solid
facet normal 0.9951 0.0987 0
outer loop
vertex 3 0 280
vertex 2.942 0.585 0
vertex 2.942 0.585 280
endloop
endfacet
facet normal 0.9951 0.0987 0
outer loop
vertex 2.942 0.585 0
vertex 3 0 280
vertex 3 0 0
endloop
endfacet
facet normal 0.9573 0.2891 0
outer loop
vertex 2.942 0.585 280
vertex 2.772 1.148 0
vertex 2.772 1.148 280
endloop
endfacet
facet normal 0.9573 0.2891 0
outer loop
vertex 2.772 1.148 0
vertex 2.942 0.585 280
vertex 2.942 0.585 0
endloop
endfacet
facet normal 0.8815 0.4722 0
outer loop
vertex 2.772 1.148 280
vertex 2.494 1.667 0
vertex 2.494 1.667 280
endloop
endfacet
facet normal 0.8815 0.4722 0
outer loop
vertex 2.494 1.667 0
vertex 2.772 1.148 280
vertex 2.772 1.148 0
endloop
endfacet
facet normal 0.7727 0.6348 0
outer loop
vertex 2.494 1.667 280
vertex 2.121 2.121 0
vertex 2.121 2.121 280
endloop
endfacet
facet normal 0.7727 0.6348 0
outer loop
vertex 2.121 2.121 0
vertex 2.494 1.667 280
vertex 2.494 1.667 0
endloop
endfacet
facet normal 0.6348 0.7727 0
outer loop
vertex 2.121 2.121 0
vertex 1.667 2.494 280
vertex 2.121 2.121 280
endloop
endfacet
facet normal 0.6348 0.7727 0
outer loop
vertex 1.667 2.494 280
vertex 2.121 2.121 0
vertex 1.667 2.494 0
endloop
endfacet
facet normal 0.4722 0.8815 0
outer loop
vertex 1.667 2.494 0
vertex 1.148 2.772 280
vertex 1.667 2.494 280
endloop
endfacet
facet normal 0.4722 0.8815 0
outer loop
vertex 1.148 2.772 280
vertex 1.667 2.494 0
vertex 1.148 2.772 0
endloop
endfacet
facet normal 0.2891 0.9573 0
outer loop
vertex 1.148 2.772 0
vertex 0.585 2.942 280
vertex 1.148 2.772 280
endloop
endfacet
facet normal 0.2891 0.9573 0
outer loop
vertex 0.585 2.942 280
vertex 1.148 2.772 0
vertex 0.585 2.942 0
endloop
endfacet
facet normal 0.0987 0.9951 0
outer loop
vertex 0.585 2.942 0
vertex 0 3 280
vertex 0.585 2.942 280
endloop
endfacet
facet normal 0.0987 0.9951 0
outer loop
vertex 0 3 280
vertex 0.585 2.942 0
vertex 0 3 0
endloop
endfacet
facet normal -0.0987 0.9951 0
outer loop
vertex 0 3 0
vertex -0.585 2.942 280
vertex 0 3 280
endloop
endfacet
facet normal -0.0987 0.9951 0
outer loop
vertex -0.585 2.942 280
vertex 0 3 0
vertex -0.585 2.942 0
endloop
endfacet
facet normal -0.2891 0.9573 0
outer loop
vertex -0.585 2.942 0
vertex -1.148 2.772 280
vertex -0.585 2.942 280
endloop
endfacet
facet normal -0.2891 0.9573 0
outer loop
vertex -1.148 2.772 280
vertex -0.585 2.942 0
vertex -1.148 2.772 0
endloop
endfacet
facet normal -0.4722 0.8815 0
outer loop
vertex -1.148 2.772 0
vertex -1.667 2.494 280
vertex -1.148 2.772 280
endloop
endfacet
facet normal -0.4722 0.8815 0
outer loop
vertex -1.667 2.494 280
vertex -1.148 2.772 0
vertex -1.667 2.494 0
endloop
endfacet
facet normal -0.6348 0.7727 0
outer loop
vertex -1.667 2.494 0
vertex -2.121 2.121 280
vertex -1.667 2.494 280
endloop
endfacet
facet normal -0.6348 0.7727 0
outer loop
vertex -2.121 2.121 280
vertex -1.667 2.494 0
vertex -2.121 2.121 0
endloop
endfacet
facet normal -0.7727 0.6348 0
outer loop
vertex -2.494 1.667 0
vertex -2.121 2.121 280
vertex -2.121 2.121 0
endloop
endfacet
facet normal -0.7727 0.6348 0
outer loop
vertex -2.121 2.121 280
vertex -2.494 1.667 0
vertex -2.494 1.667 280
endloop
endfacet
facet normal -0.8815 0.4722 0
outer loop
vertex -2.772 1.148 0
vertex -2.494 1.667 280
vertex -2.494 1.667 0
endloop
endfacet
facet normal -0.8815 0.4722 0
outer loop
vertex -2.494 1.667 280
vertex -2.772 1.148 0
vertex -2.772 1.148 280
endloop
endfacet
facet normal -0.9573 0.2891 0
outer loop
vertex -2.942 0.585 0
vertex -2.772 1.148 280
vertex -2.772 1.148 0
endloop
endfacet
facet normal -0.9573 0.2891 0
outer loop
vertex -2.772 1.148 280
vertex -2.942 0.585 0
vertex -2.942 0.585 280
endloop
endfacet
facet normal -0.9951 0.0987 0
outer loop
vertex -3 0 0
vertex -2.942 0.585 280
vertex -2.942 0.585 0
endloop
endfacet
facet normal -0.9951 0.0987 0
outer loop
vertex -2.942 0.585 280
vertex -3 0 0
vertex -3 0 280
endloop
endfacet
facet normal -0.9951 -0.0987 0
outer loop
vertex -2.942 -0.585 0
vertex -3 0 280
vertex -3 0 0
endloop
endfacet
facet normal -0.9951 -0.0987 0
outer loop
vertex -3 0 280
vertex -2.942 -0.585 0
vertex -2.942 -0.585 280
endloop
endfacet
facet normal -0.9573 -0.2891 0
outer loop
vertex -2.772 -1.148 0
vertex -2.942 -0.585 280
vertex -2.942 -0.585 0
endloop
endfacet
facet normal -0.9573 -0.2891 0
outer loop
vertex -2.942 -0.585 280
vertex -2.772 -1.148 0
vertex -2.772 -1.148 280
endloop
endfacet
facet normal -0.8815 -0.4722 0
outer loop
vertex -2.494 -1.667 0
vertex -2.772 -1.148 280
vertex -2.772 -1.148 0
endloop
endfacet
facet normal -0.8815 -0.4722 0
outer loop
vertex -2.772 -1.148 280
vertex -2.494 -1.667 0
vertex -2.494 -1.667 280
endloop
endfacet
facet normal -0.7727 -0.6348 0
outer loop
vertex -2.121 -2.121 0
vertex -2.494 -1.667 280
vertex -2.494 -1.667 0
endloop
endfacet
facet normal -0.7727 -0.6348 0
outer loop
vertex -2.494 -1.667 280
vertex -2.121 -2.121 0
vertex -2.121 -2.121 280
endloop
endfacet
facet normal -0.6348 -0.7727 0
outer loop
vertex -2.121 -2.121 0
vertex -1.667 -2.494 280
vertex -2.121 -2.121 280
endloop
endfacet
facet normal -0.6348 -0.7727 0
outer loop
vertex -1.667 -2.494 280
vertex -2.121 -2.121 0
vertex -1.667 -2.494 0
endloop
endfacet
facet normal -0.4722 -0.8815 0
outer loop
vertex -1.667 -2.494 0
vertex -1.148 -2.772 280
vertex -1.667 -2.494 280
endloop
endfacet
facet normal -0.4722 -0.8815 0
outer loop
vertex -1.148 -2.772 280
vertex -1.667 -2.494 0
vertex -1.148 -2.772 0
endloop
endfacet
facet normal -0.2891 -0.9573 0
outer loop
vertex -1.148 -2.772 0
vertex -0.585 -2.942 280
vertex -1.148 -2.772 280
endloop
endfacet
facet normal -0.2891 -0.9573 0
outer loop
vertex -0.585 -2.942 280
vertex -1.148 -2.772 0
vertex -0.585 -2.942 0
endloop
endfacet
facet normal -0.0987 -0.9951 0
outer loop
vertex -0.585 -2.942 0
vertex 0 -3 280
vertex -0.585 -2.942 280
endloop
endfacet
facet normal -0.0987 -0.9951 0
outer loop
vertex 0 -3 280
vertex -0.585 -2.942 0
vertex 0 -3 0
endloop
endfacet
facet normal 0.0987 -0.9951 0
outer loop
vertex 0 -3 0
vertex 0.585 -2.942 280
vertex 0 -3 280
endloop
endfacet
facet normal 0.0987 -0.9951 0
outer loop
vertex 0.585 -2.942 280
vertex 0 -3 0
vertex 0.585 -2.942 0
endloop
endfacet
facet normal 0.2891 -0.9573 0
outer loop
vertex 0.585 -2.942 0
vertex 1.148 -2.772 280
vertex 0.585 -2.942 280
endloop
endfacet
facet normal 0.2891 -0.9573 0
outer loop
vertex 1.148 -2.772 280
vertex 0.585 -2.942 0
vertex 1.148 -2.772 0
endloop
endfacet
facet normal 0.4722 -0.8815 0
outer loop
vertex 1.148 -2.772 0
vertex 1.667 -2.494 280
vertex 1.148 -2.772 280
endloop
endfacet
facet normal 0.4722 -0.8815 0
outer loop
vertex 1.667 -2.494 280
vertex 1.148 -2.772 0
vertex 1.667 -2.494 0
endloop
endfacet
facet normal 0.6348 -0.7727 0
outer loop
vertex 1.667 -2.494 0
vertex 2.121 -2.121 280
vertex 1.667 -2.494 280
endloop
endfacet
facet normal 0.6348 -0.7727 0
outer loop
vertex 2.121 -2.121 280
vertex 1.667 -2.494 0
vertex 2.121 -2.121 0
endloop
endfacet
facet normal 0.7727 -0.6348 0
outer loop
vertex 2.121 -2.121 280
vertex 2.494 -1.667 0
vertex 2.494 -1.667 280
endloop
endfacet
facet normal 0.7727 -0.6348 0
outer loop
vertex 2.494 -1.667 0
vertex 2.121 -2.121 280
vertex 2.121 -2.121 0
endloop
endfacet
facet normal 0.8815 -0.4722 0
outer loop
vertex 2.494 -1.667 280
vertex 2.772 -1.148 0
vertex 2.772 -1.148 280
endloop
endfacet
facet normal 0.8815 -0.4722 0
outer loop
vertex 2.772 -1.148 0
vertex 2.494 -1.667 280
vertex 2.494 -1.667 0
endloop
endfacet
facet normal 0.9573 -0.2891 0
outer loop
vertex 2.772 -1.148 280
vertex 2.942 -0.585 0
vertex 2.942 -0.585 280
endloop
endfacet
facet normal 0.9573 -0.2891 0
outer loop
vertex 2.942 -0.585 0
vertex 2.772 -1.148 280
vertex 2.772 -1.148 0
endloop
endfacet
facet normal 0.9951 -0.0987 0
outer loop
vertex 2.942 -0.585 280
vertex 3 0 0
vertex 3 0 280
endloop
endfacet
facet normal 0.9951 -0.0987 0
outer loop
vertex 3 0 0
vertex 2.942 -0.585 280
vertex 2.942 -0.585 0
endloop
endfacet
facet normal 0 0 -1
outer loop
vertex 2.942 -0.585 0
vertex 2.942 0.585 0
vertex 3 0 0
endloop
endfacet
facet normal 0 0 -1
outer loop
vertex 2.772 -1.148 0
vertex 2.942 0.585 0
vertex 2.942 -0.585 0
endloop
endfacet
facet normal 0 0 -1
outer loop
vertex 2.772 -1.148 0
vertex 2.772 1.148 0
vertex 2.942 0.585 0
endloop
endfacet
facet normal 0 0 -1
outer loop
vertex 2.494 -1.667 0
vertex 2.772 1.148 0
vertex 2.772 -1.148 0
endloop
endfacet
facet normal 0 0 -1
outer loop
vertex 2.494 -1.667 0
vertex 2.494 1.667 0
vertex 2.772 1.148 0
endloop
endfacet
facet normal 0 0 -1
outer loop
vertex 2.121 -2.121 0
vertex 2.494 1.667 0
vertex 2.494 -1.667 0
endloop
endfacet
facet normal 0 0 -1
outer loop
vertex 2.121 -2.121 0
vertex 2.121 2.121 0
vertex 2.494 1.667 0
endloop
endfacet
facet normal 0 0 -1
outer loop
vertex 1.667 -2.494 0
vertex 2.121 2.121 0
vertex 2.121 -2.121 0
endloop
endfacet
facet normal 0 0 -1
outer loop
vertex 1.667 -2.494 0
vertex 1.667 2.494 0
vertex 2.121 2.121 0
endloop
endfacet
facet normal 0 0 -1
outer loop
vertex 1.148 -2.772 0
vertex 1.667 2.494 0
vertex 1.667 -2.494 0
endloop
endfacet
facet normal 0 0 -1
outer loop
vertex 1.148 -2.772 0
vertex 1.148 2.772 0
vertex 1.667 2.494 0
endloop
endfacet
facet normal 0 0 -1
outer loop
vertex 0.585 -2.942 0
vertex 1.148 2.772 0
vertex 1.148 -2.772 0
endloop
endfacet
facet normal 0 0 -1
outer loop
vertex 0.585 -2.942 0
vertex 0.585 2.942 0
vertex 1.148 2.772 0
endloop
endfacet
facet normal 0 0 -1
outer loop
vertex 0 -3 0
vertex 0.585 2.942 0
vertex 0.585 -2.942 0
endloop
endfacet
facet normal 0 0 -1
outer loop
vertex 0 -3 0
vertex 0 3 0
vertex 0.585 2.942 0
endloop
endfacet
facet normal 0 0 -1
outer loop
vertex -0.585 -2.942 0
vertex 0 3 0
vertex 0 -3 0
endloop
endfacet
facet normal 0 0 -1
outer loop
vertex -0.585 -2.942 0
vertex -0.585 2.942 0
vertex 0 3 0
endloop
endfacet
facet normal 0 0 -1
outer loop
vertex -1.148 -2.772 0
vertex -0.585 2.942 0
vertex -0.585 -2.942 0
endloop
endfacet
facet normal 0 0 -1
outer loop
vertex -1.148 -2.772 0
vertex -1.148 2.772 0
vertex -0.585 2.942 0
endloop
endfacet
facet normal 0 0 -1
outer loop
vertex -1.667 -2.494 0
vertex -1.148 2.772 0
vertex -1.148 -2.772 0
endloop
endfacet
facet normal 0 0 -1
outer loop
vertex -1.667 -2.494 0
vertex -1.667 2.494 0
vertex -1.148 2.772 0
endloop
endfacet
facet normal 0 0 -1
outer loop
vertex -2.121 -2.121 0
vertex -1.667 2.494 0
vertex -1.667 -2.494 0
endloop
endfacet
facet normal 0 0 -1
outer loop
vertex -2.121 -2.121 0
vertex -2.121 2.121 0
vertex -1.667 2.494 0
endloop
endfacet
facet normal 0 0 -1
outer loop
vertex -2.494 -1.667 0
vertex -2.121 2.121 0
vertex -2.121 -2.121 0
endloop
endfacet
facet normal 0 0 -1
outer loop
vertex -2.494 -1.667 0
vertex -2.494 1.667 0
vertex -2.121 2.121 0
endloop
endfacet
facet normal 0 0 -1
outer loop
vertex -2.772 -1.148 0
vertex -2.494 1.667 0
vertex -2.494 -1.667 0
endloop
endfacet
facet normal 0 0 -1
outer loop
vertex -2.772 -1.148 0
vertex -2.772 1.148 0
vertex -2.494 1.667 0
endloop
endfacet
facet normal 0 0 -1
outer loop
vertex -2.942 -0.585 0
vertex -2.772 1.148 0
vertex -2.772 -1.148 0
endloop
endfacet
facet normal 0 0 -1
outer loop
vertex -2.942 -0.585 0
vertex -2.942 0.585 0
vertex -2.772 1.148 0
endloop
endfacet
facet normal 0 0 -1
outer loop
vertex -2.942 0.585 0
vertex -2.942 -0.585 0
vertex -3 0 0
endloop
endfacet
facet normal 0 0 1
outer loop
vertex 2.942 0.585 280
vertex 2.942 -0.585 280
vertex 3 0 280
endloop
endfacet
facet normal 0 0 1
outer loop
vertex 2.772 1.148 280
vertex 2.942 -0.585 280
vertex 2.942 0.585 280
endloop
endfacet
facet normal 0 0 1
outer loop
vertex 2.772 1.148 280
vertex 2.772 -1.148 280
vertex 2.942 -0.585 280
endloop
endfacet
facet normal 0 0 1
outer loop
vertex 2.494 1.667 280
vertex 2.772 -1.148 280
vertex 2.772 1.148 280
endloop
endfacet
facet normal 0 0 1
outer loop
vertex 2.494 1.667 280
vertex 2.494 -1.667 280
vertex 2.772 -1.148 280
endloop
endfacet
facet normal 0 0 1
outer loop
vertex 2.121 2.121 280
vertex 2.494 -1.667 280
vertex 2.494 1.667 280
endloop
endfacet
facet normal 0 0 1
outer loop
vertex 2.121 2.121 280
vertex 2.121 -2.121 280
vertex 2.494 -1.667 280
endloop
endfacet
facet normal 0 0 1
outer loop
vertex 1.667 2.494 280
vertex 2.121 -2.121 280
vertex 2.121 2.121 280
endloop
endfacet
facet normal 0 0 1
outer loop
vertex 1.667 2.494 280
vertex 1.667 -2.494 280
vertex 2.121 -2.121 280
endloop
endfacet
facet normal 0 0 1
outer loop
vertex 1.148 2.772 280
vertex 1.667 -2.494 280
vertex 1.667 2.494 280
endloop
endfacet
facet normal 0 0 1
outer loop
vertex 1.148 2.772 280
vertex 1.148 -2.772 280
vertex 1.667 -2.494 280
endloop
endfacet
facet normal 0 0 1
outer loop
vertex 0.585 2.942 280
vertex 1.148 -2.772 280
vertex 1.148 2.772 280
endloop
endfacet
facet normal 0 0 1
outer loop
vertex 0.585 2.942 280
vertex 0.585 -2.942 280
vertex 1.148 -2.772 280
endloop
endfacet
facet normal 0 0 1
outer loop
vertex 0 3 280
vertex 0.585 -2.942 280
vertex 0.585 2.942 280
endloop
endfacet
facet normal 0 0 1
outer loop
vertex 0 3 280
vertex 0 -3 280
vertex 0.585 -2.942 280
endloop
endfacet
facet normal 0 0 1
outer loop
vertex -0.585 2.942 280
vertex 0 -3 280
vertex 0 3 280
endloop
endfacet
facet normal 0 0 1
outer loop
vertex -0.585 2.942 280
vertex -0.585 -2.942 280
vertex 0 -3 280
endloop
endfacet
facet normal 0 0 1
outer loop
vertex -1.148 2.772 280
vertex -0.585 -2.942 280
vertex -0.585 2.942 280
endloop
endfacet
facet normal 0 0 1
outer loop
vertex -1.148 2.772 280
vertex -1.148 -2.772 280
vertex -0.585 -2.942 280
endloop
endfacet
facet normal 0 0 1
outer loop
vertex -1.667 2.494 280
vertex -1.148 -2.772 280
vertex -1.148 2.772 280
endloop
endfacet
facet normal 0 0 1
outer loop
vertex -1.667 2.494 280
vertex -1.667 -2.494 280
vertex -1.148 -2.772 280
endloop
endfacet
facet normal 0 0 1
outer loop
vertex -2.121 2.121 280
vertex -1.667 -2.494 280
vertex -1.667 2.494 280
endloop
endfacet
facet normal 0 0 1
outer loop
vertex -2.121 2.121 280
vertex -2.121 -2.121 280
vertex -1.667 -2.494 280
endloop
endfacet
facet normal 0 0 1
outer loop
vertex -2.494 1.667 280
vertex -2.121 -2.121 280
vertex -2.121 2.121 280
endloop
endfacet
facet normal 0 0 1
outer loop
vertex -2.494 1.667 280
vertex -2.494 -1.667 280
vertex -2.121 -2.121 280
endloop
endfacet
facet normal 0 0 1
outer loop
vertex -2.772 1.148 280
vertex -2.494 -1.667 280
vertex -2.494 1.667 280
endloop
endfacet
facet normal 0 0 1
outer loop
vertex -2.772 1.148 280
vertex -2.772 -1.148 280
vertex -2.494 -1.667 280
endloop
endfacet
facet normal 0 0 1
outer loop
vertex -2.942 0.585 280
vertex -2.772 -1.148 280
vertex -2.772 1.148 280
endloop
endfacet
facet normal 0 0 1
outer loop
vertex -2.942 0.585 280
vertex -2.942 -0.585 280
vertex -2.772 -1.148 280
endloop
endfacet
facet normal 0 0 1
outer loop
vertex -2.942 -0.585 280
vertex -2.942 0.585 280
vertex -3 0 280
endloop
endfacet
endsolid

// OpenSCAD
// Purchased hardware envelope; no modeled threads, not print.
$fn=32;
cylinder(d=6,h=280);
